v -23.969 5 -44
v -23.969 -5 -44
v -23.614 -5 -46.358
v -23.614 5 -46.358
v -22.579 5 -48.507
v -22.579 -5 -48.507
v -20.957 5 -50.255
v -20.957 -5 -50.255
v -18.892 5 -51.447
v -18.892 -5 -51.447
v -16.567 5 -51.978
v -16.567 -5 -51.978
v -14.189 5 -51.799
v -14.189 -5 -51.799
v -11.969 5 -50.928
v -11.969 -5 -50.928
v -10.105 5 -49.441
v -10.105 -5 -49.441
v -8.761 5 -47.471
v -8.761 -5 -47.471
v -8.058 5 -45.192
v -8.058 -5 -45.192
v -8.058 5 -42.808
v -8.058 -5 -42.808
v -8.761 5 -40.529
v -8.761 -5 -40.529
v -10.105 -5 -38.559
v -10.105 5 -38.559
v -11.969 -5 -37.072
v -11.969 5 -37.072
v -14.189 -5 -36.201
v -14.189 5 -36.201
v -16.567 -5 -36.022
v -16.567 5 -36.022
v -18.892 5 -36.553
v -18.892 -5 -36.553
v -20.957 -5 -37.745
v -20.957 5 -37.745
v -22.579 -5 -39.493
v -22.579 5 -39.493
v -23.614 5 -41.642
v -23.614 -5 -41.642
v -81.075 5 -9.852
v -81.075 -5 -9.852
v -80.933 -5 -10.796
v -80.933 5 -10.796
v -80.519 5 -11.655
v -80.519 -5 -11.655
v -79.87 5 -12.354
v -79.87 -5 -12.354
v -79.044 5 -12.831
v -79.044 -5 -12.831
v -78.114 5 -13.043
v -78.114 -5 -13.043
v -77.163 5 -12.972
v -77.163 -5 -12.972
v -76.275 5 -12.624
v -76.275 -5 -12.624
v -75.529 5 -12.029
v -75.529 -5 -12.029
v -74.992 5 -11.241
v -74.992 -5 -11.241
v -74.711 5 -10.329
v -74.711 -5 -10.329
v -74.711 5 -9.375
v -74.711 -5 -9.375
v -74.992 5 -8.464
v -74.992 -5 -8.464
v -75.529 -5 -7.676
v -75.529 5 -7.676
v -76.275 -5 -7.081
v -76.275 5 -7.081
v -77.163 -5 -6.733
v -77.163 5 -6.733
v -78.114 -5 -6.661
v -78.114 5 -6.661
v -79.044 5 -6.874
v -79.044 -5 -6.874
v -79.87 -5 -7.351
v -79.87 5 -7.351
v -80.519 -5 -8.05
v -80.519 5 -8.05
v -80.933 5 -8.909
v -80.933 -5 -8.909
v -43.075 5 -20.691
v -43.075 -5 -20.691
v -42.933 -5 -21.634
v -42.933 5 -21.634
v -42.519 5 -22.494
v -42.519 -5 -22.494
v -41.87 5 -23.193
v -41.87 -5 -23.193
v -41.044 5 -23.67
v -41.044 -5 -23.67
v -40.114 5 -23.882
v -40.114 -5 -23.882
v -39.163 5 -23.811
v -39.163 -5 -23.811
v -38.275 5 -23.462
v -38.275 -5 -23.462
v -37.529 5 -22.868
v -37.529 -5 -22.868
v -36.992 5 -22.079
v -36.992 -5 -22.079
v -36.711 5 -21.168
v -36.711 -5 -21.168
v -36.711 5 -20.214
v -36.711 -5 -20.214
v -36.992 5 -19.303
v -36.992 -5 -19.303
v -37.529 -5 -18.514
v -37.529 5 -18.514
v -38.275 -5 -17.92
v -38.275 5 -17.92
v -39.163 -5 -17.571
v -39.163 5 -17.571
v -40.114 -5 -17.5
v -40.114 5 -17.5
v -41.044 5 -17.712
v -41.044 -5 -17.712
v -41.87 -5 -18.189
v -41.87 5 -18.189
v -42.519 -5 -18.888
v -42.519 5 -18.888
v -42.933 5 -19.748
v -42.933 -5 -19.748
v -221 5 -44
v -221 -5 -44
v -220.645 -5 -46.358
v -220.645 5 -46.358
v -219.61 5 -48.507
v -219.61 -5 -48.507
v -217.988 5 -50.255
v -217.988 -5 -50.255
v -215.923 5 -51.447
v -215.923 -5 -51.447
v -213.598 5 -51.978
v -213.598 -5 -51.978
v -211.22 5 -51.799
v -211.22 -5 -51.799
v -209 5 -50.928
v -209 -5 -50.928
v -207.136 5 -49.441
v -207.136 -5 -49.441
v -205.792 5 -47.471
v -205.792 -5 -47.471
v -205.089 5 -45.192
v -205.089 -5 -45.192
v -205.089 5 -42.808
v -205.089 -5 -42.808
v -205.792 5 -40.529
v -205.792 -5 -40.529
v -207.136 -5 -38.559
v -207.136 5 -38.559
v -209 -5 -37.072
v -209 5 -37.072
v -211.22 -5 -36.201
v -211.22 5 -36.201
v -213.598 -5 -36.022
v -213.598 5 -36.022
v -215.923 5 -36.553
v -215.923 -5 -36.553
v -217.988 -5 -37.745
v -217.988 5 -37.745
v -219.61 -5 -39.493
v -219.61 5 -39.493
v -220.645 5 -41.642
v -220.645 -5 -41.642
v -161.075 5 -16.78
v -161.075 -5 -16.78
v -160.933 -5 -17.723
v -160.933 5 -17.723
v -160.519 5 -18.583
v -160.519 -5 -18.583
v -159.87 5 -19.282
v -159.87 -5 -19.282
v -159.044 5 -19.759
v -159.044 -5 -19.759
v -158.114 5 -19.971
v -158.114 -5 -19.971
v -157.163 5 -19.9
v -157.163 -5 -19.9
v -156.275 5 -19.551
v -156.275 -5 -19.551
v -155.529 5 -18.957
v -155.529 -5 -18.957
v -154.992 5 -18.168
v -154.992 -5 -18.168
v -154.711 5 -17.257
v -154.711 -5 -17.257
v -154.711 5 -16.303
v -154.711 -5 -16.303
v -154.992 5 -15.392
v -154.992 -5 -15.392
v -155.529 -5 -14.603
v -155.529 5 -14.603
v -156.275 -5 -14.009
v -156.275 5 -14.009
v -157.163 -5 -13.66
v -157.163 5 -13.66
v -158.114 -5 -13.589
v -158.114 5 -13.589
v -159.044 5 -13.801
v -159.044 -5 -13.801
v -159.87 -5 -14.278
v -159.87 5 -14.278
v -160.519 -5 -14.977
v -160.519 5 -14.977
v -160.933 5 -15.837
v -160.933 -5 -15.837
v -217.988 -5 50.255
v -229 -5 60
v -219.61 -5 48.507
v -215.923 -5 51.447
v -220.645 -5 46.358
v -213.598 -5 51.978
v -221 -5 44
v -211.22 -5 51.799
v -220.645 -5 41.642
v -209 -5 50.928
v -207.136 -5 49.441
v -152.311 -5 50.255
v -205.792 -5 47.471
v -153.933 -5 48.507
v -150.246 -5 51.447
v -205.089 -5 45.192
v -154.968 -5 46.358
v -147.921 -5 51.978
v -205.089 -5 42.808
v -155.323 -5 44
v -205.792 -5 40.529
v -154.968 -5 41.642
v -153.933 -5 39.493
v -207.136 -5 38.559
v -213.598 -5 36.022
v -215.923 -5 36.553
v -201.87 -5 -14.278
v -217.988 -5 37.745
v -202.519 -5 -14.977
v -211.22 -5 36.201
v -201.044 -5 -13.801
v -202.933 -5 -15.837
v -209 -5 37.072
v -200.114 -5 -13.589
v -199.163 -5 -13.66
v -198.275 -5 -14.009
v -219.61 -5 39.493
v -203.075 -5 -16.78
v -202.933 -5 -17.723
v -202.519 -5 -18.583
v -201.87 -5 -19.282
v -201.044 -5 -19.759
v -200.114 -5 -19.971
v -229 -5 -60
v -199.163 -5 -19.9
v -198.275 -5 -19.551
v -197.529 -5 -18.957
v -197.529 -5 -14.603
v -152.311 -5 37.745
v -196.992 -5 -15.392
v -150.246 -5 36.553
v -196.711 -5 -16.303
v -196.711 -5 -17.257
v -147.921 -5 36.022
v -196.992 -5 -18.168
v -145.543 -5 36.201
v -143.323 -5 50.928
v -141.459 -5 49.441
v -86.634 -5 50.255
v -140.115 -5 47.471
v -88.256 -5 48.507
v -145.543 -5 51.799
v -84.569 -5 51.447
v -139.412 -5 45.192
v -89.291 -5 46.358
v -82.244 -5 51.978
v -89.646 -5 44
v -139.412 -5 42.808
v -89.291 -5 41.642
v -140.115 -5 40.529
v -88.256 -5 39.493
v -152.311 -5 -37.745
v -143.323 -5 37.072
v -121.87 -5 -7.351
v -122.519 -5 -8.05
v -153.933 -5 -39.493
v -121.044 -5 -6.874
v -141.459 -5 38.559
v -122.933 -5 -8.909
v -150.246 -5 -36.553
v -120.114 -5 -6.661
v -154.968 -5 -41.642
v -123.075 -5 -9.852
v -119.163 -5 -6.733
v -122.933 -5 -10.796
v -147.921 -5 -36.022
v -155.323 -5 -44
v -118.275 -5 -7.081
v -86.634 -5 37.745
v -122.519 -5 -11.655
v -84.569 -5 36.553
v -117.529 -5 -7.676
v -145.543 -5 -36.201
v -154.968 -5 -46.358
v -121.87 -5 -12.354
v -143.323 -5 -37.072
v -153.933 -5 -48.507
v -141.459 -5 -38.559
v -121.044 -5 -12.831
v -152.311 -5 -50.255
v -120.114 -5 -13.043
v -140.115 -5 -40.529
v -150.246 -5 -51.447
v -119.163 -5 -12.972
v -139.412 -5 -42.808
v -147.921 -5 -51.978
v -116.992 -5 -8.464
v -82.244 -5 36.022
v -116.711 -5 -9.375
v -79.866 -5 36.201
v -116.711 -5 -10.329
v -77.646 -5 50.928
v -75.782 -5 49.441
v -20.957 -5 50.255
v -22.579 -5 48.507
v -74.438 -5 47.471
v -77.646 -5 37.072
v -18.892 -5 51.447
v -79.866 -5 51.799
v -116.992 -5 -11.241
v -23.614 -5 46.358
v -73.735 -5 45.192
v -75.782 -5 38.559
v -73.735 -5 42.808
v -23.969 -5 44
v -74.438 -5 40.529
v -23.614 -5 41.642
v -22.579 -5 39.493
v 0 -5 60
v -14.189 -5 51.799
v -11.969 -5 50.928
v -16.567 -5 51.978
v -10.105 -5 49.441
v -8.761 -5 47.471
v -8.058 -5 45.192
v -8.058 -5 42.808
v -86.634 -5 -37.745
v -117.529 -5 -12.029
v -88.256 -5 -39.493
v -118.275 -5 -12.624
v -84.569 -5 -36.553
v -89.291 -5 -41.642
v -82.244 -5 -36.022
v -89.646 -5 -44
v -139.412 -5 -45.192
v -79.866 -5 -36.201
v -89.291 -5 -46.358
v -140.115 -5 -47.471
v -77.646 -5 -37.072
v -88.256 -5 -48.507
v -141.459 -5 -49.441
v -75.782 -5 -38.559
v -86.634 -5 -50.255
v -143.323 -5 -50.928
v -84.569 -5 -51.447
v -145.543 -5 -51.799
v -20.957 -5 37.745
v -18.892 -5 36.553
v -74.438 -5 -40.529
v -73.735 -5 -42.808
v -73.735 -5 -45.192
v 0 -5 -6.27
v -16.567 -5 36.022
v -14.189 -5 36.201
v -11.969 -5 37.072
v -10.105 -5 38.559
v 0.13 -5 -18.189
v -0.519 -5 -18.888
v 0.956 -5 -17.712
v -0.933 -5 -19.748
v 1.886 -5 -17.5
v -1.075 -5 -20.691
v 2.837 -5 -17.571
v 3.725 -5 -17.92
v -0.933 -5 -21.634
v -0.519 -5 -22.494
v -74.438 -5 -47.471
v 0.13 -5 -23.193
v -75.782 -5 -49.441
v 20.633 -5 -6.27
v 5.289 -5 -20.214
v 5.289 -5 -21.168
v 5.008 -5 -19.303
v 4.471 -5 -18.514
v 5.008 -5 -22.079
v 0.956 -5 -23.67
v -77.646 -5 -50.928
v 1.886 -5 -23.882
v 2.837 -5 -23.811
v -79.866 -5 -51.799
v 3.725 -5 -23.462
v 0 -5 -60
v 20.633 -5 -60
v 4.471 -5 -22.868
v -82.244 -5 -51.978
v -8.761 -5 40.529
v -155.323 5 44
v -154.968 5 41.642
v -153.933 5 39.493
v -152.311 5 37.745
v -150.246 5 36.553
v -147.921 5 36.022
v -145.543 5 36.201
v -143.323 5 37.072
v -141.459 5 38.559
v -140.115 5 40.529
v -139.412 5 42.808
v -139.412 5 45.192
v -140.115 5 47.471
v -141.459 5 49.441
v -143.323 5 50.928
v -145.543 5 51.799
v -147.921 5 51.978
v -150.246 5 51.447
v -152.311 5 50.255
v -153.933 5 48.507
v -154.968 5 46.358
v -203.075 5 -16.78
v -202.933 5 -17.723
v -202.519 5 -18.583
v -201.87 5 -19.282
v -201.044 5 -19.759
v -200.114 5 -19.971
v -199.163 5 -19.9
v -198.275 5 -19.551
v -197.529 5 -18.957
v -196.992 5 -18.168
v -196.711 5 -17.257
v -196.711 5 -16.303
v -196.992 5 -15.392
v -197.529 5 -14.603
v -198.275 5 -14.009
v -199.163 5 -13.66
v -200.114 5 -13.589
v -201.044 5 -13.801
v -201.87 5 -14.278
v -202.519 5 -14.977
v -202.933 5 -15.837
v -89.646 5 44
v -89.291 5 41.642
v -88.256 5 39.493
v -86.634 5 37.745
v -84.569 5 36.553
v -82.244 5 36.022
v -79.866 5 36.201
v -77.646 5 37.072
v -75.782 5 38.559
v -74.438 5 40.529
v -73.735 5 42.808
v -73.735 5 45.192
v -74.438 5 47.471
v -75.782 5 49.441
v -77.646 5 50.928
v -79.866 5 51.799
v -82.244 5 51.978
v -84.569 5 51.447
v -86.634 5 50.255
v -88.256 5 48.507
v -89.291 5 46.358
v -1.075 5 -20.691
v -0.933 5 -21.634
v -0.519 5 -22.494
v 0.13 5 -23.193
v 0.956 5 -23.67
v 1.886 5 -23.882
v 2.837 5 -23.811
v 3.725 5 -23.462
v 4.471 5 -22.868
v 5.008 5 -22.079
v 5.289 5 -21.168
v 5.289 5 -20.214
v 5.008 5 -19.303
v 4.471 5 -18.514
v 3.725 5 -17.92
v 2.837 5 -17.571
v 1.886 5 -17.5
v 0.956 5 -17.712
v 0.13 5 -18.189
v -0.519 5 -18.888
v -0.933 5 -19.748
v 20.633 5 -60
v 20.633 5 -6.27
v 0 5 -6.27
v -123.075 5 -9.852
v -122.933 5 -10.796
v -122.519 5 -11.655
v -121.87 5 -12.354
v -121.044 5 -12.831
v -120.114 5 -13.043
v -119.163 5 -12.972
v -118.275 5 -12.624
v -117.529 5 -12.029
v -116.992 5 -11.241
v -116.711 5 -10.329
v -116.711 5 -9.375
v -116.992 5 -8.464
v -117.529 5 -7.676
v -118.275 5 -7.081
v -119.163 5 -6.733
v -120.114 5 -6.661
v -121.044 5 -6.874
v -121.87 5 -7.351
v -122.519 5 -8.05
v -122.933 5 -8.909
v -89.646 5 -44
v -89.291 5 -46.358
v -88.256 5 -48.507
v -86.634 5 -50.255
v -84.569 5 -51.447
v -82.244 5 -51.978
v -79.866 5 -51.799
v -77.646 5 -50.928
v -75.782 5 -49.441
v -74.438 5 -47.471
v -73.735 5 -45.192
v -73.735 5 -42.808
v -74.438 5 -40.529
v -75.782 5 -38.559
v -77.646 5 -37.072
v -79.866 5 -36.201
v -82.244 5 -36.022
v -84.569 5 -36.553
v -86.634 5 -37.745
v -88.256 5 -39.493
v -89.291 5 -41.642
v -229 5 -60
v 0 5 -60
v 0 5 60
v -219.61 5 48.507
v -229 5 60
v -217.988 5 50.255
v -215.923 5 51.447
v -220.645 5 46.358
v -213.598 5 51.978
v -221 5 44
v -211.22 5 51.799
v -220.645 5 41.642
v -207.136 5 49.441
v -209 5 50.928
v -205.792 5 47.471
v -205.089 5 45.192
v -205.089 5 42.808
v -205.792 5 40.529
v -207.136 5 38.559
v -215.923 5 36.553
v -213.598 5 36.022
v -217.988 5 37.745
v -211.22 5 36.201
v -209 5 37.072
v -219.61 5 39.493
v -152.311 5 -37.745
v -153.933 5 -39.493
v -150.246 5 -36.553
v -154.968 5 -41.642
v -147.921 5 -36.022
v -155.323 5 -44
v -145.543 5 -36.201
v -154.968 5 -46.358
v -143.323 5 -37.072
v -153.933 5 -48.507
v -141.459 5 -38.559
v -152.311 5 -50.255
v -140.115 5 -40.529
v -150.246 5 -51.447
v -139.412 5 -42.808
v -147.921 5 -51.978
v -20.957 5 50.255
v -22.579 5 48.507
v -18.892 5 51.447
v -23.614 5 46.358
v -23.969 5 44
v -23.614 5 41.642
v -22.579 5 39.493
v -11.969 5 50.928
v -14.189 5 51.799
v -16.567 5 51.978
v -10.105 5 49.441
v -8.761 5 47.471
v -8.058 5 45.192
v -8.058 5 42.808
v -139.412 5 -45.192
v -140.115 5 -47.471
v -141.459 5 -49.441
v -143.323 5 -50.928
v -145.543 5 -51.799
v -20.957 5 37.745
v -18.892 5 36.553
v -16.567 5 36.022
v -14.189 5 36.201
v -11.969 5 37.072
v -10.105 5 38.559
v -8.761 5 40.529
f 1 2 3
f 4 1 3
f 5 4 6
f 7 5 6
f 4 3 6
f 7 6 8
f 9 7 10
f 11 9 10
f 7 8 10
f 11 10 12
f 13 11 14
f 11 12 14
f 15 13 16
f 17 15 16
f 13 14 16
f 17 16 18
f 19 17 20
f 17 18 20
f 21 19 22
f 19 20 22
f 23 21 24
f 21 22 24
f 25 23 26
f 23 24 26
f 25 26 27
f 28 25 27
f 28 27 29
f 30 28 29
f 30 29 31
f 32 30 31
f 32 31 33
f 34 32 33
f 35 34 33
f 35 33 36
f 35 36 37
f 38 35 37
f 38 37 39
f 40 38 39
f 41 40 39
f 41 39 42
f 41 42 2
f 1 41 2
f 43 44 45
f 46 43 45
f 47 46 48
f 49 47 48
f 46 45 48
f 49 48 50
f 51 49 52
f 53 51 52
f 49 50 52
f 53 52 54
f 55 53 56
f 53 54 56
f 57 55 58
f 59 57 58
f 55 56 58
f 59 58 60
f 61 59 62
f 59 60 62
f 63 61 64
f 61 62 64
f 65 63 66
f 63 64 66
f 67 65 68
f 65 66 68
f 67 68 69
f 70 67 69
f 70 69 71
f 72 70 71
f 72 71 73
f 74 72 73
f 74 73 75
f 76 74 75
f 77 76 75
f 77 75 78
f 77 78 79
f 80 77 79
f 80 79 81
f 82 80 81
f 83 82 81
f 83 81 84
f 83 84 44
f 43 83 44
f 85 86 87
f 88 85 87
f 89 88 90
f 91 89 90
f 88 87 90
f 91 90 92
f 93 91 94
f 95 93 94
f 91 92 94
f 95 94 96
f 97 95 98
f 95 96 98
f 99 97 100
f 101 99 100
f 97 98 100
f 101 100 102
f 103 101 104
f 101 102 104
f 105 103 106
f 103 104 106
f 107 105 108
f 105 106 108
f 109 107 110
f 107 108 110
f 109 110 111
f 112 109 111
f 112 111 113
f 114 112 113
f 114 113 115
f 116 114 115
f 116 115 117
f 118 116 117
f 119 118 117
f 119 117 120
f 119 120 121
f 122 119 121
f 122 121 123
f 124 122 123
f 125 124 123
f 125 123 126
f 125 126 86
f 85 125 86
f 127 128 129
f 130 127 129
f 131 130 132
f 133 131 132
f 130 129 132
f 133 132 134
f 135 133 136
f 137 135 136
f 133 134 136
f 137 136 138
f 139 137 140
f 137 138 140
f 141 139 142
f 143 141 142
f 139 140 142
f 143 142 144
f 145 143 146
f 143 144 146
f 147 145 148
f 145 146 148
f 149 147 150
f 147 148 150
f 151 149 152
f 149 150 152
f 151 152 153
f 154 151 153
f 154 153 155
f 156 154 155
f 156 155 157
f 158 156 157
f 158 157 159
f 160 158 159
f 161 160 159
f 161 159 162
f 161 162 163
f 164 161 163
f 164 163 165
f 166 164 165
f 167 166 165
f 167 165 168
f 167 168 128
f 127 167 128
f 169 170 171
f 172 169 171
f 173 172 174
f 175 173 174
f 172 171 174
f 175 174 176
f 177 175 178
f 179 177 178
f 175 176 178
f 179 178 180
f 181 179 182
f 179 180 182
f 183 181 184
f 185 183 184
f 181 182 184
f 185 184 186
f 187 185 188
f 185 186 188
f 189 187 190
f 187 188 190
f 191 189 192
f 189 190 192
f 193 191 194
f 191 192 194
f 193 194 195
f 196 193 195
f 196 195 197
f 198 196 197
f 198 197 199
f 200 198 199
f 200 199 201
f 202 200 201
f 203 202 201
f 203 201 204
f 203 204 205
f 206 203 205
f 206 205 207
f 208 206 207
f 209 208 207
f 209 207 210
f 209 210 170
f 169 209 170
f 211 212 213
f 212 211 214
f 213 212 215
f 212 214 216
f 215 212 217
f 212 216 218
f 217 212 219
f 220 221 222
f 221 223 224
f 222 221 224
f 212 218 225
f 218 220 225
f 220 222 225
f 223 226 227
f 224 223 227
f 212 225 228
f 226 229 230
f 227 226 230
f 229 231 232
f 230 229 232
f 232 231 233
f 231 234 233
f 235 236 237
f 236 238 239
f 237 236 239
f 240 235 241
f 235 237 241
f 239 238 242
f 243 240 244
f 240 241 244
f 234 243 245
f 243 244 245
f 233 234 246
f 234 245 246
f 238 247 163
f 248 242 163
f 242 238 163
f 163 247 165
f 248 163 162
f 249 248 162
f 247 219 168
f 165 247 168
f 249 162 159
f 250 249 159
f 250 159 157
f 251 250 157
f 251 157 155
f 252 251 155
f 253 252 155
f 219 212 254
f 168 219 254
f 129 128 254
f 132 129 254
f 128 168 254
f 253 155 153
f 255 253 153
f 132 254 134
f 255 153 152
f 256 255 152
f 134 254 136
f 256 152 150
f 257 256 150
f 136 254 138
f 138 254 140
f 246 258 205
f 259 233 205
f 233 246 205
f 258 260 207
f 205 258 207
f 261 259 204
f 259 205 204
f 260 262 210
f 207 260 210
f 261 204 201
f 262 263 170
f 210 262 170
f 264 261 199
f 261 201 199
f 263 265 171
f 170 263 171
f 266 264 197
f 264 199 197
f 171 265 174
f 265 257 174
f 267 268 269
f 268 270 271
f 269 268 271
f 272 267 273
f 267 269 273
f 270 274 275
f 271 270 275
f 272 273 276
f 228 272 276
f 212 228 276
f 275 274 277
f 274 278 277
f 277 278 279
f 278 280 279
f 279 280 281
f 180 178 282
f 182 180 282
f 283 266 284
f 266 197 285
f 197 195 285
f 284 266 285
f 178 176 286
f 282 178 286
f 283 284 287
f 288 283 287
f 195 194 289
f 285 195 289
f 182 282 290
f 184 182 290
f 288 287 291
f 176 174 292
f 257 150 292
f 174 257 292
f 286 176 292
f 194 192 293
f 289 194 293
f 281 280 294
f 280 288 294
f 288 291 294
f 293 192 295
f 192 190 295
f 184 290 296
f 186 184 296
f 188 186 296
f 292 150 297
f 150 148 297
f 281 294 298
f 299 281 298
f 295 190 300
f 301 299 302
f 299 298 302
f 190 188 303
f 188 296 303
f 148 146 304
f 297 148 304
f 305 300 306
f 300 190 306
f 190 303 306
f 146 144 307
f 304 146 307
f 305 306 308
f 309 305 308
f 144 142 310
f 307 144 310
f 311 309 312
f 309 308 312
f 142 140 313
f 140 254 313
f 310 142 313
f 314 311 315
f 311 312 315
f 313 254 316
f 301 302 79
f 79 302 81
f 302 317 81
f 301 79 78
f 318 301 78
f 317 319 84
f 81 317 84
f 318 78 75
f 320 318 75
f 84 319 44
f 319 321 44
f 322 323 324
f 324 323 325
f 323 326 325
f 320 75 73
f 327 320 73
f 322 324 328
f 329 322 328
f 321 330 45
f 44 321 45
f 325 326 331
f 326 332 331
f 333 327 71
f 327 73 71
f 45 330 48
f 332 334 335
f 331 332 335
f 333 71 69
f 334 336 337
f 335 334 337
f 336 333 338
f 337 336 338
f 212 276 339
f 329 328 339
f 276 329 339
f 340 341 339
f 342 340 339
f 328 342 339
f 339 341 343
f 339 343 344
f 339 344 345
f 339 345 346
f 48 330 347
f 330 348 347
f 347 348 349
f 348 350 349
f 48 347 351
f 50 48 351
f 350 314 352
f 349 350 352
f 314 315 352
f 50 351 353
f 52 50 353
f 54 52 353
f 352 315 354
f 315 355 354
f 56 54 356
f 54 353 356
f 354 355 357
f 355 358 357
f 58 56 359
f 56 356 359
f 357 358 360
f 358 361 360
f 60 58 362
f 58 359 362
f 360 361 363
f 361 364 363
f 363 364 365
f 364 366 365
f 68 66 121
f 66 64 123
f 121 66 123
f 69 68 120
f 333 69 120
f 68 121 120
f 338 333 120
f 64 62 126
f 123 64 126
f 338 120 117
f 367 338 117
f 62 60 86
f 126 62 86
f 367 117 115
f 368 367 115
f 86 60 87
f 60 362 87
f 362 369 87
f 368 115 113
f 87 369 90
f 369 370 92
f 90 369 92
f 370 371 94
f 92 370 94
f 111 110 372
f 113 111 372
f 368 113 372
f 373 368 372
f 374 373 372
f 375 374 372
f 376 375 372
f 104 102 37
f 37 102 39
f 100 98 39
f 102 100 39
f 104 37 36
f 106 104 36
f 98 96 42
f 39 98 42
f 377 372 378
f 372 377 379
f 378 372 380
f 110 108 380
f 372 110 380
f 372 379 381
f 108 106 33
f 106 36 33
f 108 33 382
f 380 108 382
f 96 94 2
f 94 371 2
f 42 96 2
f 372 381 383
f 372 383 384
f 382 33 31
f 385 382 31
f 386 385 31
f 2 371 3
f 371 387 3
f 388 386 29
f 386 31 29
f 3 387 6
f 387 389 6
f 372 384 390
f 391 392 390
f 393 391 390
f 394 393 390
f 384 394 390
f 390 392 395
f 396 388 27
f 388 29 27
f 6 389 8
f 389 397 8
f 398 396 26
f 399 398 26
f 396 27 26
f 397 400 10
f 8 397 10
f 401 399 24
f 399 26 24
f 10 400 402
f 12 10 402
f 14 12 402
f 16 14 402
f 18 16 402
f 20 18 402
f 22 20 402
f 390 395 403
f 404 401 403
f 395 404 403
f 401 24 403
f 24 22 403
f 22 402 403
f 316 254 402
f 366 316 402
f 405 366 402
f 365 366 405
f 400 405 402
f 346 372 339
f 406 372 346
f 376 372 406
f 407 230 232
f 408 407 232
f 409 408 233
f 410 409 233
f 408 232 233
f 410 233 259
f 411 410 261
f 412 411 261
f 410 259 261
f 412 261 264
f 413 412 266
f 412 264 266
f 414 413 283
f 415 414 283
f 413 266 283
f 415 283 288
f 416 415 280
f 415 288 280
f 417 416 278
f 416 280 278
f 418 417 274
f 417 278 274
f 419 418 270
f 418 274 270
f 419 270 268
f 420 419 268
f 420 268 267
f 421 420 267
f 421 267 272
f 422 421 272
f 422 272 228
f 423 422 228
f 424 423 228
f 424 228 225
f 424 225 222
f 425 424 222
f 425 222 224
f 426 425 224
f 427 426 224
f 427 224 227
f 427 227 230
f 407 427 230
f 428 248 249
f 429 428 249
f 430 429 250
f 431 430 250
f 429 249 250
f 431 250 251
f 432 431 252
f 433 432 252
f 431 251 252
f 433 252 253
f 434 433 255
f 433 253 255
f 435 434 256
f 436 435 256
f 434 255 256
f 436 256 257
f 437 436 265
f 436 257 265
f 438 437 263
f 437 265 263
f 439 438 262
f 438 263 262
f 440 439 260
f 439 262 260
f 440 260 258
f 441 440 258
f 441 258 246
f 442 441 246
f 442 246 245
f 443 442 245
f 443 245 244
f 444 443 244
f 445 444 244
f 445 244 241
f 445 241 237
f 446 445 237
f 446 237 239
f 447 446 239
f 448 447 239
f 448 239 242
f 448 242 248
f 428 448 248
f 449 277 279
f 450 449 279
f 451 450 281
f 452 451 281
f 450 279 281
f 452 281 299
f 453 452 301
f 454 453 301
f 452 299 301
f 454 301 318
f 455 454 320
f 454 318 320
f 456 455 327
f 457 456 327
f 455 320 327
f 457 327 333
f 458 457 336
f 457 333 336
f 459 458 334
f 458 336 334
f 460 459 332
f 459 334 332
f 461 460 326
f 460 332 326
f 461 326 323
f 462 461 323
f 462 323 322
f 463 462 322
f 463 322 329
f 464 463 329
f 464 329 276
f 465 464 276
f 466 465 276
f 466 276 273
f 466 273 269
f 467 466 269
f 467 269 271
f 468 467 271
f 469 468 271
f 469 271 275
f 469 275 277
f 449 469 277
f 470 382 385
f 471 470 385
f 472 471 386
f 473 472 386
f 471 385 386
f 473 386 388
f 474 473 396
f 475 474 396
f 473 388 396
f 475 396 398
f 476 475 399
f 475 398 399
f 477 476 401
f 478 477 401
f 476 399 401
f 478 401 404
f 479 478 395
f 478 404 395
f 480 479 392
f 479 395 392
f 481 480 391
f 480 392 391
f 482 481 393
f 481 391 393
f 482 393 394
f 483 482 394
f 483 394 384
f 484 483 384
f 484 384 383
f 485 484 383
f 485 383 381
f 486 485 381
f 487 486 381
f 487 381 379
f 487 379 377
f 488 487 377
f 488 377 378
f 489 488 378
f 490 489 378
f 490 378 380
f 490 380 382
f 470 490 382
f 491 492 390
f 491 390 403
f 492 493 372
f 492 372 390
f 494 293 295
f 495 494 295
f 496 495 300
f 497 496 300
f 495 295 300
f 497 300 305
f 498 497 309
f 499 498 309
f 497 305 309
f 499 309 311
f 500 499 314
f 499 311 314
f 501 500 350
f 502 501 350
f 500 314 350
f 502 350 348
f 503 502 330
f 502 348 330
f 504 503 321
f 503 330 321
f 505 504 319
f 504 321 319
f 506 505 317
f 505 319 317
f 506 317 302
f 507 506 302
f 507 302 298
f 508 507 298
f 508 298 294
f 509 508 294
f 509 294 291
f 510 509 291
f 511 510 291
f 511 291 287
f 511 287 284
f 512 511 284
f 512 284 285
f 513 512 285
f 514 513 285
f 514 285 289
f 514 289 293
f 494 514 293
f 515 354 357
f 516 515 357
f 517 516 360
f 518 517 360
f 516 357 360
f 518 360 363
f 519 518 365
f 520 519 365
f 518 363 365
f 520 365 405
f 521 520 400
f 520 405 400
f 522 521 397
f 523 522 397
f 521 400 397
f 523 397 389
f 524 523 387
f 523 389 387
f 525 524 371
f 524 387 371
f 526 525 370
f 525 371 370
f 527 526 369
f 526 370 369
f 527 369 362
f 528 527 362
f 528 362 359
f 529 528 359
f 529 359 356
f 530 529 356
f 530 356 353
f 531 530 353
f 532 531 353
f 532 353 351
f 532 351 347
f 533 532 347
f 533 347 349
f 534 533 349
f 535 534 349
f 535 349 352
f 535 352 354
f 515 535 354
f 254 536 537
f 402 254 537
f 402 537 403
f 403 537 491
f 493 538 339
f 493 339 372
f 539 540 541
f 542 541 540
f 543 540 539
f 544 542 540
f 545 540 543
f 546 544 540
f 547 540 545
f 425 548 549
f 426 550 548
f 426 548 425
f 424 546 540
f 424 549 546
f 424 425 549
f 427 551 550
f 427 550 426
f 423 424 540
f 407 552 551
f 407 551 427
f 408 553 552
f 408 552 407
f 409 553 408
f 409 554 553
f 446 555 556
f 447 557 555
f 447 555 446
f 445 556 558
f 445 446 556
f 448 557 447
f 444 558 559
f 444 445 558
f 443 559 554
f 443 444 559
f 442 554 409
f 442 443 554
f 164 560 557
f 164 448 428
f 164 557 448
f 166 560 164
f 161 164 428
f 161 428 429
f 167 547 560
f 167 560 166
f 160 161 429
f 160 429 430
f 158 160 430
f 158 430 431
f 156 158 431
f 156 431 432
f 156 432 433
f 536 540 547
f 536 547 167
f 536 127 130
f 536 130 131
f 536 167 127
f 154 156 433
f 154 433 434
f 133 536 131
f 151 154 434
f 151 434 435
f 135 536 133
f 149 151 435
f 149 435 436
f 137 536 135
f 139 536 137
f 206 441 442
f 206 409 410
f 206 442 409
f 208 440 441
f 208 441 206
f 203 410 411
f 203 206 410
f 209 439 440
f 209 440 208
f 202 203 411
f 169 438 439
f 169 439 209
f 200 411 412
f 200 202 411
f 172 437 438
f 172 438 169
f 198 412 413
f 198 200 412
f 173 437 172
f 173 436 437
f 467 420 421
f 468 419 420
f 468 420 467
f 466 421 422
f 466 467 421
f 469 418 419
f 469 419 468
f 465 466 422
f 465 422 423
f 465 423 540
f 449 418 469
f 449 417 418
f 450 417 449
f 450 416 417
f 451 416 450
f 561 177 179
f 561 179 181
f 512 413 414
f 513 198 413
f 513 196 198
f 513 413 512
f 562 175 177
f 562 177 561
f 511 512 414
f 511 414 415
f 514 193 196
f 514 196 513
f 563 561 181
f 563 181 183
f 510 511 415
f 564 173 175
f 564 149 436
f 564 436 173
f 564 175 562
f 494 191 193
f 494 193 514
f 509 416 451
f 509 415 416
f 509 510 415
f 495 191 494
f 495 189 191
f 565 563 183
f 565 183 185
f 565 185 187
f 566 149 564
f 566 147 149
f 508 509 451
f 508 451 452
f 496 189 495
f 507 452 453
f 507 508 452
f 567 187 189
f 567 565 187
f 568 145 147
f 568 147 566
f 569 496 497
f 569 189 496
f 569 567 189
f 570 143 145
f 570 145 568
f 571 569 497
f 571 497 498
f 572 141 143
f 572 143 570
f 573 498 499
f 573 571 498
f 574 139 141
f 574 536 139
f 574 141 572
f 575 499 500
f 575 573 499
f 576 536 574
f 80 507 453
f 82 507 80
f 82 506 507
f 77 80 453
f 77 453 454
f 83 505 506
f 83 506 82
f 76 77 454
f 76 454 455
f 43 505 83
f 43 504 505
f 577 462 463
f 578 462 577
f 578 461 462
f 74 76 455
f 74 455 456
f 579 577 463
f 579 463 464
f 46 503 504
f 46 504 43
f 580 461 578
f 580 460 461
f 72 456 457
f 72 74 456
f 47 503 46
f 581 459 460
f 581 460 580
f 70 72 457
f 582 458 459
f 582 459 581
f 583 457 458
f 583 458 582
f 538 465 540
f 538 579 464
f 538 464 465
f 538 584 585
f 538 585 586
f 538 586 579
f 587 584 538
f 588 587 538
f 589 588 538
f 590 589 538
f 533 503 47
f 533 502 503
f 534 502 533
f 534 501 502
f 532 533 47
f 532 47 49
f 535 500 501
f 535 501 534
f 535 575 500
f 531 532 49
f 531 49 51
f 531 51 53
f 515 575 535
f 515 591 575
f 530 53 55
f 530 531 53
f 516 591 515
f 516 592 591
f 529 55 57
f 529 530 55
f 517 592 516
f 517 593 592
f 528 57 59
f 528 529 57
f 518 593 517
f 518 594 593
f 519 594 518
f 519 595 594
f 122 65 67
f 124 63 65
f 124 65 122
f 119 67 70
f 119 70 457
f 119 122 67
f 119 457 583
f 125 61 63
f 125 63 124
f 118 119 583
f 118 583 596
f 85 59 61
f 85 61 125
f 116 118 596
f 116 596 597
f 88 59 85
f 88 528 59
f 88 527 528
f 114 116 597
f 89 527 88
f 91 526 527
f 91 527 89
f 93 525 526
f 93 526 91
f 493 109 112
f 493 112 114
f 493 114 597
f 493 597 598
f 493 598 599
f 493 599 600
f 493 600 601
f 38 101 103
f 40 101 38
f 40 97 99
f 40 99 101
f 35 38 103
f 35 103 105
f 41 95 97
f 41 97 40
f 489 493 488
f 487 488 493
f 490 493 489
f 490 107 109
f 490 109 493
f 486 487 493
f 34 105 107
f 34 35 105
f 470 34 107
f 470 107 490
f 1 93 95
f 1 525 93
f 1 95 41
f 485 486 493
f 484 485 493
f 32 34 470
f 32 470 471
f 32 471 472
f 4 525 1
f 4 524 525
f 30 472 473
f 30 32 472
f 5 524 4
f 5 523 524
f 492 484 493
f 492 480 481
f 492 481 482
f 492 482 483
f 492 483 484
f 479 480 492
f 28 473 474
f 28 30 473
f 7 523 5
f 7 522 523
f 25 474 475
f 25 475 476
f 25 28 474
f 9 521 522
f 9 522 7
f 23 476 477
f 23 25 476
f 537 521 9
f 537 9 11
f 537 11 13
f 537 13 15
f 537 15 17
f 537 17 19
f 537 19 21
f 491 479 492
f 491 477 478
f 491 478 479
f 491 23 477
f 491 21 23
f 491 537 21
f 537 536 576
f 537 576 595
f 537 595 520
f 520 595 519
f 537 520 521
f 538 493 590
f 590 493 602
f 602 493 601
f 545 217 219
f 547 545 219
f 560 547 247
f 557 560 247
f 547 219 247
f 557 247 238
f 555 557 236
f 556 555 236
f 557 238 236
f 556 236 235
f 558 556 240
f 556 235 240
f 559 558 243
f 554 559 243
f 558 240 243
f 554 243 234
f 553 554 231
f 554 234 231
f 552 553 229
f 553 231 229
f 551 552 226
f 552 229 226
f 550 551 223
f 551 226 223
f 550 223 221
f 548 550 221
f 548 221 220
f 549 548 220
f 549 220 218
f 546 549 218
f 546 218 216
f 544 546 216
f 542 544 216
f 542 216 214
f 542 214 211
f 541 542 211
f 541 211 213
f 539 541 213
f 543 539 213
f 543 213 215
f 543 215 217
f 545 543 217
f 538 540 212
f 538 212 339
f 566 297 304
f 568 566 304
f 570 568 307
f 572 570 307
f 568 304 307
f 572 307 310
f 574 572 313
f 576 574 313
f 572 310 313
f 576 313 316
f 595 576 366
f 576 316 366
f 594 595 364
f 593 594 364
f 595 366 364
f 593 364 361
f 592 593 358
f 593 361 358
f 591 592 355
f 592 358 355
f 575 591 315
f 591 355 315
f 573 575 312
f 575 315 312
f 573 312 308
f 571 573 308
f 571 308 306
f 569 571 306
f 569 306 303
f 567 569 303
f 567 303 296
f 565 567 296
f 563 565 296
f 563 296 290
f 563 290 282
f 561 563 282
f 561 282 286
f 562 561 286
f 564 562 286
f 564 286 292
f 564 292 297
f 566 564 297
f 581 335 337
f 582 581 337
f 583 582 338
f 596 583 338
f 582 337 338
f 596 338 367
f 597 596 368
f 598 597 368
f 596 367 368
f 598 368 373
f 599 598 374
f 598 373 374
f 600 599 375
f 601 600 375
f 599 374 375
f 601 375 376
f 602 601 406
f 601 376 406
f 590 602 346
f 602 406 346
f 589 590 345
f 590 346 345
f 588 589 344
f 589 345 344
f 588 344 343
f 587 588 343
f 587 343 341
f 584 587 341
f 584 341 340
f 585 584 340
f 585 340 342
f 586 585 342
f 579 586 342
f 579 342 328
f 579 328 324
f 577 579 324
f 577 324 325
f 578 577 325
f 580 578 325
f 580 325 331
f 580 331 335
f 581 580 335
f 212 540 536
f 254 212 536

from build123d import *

# Parameters (mm, degrees)
SKETCH1_W                  = 229
SKETCH1_H                  = 120
BOSS_EXTRUDE1_DEPTH        = 5
SKETCH4_W                  = 20.632503002
SKETCH4_H                  = 53.730004003
BOSS_EXTRUDE2_DEPTH        = 10
F_16_0_16_DIAMETER_HOLE1_D = 16
M6_CLEARANCE_HOLE1_D       = 6.4


with BuildPart() as part:
    # Sketch1 → Boss-Extrude1 (new, symmetric)
    with BuildSketch(Plane(origin=(0, 0, 0), x_dir=(1, 0, 0), z_dir=(0, 1, 0))):
        with Locations((-114.5, 0)):
            Rectangle(SKETCH1_W, SKETCH1_H)
    extrude(amount=BOSS_EXTRUDE1_DEPTH, both=True)

    # Sketch4 → Boss-Extrude2 (add)
    with BuildSketch(Plane(origin=(0, 5, 0), x_dir=(1, 0, 0), z_dir=(0, 1, 0))):
        with Locations((10.316251501, 33.134997999)):
            Rectangle(SKETCH4_W, SKETCH4_H)
    extrude(amount=-BOSS_EXTRUDE2_DEPTH)

    # Ø16.0 (16) Diameter Hole1 (through all)
    with Locations(Plane(origin=(0, 5, 0), x_dir=(1, 0, 0), z_dir=(0, 1, 0))):
        with Locations((-213, 44), (-147.323, 44), (-81.646, 44), (-15.969, 44), (-213, -44), (-147.323, -44), (-81.646, -44), (-15.969, -44)):
            Hole(F_16_0_16_DIAMETER_HOLE1_D / 2)

    # M6 Clearance Hole1 (through all)
    with Locations(Plane(origin=(0, 5, 0), x_dir=(1, 0, 0), z_dir=(0, 1, 0))):
        with Locations((-199.875, 16.78), (-157.875, 16.78), (-119.875, 9.852366083), (-77.875, 9.852366083), (-39.875, 20.69101), (2.125, 20.69101)):
            Hole(M6_CLEARANCE_HOLE1_D / 2)


solid = part.part
